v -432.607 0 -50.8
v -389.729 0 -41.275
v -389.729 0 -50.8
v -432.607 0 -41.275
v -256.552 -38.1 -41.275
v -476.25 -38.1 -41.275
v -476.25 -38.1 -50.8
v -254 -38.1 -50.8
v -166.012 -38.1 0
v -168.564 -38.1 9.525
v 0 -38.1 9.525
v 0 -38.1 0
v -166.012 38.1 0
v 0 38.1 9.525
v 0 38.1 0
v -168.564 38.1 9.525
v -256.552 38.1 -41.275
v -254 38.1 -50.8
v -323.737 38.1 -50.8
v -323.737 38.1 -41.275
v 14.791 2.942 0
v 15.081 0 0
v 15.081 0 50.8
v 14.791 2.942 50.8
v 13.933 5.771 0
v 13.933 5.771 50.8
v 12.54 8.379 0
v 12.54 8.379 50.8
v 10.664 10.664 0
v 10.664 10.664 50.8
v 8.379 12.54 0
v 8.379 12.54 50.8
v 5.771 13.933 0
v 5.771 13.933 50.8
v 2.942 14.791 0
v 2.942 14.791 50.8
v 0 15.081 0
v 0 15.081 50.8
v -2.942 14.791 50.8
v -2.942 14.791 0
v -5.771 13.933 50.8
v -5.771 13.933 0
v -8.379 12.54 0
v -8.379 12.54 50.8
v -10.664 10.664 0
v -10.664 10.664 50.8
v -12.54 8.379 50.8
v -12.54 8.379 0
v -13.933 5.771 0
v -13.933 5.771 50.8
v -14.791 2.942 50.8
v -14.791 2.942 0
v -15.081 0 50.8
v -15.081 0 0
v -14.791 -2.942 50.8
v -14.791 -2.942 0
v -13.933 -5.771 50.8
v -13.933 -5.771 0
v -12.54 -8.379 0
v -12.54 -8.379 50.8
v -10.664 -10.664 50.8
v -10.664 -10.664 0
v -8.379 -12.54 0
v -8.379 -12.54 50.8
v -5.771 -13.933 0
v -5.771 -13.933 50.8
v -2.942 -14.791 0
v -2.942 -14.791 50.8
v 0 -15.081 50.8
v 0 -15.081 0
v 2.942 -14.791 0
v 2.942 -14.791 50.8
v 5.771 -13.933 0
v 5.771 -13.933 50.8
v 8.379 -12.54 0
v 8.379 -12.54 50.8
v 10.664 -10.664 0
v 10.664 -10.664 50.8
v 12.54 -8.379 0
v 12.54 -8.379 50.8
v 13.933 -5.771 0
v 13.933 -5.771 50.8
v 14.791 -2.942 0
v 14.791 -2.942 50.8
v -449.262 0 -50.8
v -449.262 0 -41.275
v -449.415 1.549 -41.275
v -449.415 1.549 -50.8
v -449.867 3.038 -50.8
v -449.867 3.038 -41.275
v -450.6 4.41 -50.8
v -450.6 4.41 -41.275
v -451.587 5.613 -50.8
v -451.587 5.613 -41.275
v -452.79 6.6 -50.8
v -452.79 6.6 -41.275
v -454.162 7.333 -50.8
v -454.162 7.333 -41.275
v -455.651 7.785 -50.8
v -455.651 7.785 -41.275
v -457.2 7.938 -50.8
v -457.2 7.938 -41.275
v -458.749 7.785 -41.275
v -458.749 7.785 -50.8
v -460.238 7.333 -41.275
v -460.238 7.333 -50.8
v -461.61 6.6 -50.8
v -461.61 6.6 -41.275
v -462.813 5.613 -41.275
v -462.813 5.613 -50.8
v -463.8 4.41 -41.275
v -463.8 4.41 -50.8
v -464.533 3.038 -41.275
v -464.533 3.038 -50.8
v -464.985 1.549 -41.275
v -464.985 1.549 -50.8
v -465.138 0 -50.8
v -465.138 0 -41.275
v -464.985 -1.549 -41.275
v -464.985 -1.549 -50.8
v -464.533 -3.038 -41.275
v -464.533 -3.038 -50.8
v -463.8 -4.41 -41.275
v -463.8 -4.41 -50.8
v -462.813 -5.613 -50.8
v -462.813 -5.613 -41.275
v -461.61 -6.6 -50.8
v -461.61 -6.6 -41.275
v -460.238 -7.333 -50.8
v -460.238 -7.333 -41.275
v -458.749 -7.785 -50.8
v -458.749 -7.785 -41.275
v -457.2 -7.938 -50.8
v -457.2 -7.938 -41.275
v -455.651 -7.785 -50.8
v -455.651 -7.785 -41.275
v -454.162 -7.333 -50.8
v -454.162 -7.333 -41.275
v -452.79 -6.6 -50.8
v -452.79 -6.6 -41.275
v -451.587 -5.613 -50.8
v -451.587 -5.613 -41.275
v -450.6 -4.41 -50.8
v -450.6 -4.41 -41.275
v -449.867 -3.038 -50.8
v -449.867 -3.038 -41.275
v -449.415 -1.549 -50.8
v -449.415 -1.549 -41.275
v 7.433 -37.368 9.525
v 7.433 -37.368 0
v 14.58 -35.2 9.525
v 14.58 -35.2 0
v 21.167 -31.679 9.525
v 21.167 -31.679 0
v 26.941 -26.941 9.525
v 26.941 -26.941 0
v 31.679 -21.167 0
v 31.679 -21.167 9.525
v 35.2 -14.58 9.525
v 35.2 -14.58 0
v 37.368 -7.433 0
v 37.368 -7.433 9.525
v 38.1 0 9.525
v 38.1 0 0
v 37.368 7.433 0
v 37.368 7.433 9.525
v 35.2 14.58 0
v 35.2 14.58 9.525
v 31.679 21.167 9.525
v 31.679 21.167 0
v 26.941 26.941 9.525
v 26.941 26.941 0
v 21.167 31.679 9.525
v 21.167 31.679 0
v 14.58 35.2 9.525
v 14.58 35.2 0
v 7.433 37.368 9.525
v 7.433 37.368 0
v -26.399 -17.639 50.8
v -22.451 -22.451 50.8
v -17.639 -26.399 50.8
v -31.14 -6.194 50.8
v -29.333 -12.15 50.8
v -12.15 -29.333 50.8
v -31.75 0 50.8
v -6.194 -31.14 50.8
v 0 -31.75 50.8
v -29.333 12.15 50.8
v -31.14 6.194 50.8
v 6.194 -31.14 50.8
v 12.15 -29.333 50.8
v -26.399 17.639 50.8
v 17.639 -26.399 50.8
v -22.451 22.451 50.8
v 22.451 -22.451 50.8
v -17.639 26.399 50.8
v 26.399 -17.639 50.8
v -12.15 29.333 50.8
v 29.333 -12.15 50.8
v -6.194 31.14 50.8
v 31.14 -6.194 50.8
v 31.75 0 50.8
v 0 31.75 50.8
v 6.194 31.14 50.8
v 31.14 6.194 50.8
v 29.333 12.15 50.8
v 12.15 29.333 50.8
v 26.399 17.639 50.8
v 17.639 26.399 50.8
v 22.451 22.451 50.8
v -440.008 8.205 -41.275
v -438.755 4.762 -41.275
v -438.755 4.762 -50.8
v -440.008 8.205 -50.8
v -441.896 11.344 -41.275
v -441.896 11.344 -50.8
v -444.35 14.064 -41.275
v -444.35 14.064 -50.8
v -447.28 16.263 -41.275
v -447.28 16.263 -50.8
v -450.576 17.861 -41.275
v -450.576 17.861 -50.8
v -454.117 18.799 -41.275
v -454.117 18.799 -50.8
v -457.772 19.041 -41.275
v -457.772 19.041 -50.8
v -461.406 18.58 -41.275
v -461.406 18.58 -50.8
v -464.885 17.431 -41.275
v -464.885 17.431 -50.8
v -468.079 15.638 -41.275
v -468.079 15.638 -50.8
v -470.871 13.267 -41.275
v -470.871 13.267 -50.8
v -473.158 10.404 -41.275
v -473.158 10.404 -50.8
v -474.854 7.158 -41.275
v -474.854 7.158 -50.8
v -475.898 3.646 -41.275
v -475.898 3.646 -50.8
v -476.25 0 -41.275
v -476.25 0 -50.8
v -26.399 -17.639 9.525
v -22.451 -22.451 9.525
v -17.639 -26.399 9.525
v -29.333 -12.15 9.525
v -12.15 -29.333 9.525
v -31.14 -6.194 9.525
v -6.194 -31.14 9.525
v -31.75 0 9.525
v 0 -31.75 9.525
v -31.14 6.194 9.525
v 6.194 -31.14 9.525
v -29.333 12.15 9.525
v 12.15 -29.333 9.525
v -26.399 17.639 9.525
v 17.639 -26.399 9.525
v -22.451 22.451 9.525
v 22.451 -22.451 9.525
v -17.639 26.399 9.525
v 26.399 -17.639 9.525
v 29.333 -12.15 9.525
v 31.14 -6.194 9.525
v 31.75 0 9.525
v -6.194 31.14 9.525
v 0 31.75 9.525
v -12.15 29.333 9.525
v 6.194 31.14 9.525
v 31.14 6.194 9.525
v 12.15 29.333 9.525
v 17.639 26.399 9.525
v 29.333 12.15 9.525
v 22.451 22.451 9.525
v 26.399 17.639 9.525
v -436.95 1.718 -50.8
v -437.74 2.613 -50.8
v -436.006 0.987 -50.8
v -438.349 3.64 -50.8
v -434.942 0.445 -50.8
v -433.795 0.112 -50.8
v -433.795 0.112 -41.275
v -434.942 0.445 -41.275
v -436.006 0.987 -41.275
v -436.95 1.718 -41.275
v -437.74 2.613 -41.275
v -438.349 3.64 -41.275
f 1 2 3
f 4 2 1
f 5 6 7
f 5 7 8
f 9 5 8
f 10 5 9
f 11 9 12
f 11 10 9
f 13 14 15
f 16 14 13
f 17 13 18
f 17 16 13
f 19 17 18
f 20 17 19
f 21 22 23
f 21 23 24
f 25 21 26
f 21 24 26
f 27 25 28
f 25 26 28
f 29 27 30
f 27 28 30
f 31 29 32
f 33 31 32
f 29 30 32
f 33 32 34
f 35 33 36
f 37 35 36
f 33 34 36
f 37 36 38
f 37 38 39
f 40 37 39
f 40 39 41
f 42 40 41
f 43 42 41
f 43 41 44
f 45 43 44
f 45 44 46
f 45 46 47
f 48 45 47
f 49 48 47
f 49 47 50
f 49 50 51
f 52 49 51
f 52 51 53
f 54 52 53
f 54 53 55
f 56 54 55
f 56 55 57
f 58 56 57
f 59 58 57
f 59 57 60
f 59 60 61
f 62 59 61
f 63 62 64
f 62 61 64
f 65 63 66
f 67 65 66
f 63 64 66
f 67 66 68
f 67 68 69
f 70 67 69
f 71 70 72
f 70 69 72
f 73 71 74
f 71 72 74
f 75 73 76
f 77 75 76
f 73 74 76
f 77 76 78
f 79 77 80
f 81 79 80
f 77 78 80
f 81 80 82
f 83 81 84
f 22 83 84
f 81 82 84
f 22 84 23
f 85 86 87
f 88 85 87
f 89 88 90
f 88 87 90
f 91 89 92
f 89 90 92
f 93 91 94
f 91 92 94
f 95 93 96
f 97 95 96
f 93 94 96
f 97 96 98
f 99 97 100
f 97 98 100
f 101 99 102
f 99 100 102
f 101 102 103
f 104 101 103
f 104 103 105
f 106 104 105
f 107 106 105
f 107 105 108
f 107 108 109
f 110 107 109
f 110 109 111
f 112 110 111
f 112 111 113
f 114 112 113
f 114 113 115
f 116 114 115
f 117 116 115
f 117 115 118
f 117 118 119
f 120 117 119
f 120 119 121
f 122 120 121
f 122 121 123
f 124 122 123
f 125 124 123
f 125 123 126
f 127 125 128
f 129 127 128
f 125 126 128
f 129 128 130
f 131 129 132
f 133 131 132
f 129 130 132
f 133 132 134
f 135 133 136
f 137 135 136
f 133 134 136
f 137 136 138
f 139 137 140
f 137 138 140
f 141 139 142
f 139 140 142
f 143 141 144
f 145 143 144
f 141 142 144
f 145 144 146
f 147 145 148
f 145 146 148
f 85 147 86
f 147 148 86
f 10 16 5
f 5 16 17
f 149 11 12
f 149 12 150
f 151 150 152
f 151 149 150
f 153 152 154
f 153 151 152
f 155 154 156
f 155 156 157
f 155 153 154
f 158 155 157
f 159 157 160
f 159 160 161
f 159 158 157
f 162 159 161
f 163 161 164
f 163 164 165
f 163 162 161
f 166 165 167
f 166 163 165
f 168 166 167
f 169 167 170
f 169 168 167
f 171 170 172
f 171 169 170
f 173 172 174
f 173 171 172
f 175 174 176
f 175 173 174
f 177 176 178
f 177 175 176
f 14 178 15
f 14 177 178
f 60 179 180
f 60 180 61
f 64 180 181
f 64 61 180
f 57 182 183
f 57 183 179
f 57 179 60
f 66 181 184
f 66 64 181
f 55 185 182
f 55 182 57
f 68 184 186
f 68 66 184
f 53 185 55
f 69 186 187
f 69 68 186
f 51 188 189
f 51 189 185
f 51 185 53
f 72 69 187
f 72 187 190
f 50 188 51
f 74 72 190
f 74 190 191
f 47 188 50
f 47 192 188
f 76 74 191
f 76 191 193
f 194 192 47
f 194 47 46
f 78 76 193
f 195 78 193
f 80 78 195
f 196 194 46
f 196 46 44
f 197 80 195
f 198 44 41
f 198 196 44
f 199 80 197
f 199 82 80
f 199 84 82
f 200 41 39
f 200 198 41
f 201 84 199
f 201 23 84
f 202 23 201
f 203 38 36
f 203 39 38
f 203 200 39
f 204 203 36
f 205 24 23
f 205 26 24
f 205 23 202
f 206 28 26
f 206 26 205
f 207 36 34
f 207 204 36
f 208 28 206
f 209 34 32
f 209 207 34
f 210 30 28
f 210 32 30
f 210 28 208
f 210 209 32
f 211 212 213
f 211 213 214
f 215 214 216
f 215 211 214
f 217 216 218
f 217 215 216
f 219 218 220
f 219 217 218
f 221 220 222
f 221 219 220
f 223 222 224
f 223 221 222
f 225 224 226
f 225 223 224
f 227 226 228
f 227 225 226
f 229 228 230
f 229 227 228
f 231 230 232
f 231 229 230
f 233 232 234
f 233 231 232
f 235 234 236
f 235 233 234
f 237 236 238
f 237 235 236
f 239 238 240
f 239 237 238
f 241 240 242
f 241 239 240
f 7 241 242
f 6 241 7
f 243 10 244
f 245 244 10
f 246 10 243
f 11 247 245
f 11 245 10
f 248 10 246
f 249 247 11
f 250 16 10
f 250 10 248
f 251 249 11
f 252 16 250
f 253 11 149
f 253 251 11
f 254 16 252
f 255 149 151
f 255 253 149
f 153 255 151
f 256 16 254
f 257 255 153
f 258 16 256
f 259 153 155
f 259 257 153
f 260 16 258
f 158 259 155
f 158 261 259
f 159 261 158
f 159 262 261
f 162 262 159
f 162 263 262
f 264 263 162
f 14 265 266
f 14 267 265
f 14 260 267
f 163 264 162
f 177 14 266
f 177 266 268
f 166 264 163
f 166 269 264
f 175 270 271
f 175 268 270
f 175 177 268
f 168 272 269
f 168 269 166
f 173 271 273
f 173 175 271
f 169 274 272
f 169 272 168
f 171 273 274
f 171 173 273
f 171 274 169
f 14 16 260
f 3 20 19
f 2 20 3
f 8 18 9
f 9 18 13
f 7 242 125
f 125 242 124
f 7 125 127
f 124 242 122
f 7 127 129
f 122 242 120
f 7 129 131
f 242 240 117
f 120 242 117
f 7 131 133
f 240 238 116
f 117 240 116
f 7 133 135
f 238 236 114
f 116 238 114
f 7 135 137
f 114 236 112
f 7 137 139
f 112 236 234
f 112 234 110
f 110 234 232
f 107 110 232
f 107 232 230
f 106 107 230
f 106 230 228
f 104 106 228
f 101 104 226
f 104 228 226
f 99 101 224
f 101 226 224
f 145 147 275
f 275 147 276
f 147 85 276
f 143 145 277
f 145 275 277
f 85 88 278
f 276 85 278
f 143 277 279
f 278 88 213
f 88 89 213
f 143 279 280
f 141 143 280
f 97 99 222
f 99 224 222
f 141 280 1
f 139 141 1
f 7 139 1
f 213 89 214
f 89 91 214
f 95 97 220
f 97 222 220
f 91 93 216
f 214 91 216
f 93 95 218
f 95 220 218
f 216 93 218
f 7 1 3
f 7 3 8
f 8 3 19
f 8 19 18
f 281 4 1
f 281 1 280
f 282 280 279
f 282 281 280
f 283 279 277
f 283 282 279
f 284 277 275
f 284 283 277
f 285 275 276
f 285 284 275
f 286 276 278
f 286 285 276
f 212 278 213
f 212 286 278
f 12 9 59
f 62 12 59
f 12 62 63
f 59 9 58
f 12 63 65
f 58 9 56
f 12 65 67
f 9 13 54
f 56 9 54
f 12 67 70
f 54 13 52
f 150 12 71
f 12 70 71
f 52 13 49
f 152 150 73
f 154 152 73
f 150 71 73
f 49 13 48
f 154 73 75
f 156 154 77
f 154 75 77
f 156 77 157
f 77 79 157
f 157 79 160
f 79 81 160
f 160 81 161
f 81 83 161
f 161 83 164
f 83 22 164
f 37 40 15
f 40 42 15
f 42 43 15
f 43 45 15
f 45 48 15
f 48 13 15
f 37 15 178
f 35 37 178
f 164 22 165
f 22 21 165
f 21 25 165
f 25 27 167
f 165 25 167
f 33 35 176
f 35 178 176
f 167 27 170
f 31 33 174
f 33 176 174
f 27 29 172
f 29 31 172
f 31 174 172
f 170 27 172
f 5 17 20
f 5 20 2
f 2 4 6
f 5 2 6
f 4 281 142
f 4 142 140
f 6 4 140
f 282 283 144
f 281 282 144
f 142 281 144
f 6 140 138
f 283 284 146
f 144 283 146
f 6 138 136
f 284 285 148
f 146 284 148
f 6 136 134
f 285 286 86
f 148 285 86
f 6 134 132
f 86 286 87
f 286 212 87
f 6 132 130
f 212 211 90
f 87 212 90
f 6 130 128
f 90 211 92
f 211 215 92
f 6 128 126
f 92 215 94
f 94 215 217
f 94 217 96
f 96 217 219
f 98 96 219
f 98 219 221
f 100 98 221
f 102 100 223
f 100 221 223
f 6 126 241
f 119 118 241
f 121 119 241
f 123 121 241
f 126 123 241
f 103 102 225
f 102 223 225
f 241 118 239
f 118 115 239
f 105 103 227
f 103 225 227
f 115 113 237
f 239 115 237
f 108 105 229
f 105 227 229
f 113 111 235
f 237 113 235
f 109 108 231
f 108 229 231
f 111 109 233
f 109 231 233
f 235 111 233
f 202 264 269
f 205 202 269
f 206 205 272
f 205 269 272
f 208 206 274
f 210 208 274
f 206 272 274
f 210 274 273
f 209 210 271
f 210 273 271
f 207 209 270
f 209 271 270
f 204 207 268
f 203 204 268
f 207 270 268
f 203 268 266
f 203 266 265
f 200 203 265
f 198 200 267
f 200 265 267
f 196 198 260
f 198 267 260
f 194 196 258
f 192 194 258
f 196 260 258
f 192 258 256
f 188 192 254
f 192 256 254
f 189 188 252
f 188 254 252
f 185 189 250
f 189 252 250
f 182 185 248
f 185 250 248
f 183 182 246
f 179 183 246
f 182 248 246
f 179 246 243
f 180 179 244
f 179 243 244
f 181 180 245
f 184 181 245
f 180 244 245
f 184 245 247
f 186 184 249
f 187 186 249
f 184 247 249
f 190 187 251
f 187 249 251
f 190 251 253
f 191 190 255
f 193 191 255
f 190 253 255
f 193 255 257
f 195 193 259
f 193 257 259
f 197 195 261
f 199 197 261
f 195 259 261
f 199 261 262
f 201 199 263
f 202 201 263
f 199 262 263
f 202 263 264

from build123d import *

# Parameters (mm, degrees)
F0_R          = 7.9375
F1_DEPTH      = 9.525
F1_DEPTH_BACK = 50.8
F2_R          = 31.75
F3_DEPTH      = 41.275
F4_R          = 15.08125
F5_DEPTH      = 101.601
F7_DEPTH      = 76.201


with BuildPart() as f1:
    # F0 (on Top) → F1 (new body, two sides)
    with BuildSketch(Plane.XY) as f1_sk:
        with BuildLine():
            Line((-476.25, -38.1), (0, -38.1))
            ThreePointArc((0, -38.1), (38.1, 0), (0, 38.1))
            Line((0, 38.1), (-180.615451, 38.1))
            Line((-180.615451, 38.1), (-323.73747, 38.1))
            Line((-323.73747, 38.1), (-389.728606, 0))
            Line((-389.728606, 0), (-432.606556, 0))
            ThreePointArc((-432.606556, 0), (-436.495121, 1.329884), (-438.754917, 4.7625))
            ThreePointArc((-438.754917, 4.7625), (-459.600382, 18.898166), (-476.25, 0))
            Line((-476.25, 0), (-476.25, -38.1))
        make_face()
        with Locations((-457.2, 0)):
            Circle(F0_R, mode=Mode.SUBTRACT)
    extrude(amount=F1_DEPTH)
    extrude(f1_sk.sketch, amount=-F1_DEPTH_BACK)

    # F2 (on face) → F3 (join)
    with BuildSketch(Plane.XY.offset(9.525)):
        Circle(F2_R)
    extrude(amount=F3_DEPTH)

    # F4 (on face) → F5 (cut, through all)
    with BuildSketch(Plane.XY.offset(50.8)):
        Circle(F4_R)
    extrude(amount=-F5_DEPTH, mode=Mode.SUBTRACT)

    # F6 (on face) → F7 (cut, through all)
    with BuildSketch(Plane(origin=(0, 38.1, 0), x_dir=(-1, 0, 0), z_dir=(0, 1, 0))):
        Polygon((-101.6, -50.8), (254, -50.8), (166.011819, 0), (-101.6, 0), align=None)
        Polygon((524.164035, 9.525), (168.564035, 9.525), (256.552216, -41.275), (524.164035, -41.275), align=None)
    extrude(amount=-F7_DEPTH, mode=Mode.SUBTRACT)


solid = f1.part
